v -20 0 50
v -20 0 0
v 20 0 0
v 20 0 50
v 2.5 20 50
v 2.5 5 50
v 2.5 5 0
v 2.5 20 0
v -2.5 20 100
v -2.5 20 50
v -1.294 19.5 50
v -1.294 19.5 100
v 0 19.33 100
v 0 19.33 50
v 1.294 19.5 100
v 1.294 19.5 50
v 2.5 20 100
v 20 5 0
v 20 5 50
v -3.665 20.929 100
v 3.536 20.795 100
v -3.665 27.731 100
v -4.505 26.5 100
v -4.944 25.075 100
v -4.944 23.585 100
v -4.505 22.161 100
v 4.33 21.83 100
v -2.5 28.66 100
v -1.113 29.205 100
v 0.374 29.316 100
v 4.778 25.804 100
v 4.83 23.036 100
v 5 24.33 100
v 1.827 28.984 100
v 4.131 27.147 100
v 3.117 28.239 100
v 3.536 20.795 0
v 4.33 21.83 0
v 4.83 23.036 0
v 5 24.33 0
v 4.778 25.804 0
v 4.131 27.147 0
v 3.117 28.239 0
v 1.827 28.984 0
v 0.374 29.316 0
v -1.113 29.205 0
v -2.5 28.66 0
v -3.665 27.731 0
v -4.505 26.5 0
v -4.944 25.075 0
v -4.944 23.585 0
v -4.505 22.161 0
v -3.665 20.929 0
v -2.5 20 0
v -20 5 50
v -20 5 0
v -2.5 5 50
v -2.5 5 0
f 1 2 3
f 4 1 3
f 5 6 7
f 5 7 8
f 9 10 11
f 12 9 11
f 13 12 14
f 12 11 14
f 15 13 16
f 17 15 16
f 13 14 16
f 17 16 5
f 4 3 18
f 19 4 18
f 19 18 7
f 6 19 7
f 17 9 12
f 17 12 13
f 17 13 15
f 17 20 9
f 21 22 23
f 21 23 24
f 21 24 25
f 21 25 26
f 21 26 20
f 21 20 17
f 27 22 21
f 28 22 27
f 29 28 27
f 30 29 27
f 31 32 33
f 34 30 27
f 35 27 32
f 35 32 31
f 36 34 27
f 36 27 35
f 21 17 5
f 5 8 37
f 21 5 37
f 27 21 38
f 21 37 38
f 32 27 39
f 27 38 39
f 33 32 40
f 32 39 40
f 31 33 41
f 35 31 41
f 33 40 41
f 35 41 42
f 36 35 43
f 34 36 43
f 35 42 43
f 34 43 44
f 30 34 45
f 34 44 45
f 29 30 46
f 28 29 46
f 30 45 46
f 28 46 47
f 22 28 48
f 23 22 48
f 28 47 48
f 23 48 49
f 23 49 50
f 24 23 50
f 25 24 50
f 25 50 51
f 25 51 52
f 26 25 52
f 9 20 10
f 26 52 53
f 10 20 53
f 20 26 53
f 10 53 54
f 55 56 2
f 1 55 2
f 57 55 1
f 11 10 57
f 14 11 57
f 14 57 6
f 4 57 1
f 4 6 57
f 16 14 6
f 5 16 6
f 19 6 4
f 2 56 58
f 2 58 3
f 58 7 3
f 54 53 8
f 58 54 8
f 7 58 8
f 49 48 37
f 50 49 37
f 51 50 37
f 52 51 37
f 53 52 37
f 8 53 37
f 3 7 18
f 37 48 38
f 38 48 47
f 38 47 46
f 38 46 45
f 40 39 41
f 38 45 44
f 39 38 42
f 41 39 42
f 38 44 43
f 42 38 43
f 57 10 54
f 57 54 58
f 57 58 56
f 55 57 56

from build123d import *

# Parameters (mm, degrees)
F1_DEPTH = 50
F2_DEPTH = 100


with BuildPart() as f1:
    # F0 (on Top) → F1 (new body)
    with BuildSketch(Plane.XY):
        Polygon((-2.5, 5), (-20, 5), (-20, 0), (20, 0), (20, 5), (2.5, 5), align=None)
        with BuildLine():
            Line((-2.5, 20), (-2.5, 5))
            Line((-2.5, 5), (2.5, 5))
            Line((2.5, 5), (2.5, 20))
            ThreePointArc((2.5, 20), (0, 19.330127), (-2.5, 20))
        make_face()
        with BuildLine():
            ThreePointArc((5, 24.330127), (-2.5, 28.660254), (-2.5, 20))
            Line((-2.5, 20), (2.5, 20))
            ThreePointArc((2.5, 20), (4.330127, 21.830127), (5, 24.330127))
        make_face()
        with BuildLine():
            Line((2.5, 20), (-2.5, 20))
            ThreePointArc((-2.5, 20), (0, 19.330127), (2.5, 20))
        make_face()
    extrude(amount=F1_DEPTH)

    # F0 (on Top) → F2 (join)
    with BuildSketch(Plane.XY):
        with BuildLine():
            Line((2.5, 20), (-2.5, 20))
            ThreePointArc((-2.5, 20), (0, 19.330127), (2.5, 20))
        make_face()
        with BuildLine():
            ThreePointArc((5, 24.330127), (-2.5, 28.660254), (-2.5, 20))
            Line((-2.5, 20), (2.5, 20))
            ThreePointArc((2.5, 20), (4.330127, 21.830127), (5, 24.330127))
        make_face()
    extrude(amount=F2_DEPTH)


solid = f1.part
